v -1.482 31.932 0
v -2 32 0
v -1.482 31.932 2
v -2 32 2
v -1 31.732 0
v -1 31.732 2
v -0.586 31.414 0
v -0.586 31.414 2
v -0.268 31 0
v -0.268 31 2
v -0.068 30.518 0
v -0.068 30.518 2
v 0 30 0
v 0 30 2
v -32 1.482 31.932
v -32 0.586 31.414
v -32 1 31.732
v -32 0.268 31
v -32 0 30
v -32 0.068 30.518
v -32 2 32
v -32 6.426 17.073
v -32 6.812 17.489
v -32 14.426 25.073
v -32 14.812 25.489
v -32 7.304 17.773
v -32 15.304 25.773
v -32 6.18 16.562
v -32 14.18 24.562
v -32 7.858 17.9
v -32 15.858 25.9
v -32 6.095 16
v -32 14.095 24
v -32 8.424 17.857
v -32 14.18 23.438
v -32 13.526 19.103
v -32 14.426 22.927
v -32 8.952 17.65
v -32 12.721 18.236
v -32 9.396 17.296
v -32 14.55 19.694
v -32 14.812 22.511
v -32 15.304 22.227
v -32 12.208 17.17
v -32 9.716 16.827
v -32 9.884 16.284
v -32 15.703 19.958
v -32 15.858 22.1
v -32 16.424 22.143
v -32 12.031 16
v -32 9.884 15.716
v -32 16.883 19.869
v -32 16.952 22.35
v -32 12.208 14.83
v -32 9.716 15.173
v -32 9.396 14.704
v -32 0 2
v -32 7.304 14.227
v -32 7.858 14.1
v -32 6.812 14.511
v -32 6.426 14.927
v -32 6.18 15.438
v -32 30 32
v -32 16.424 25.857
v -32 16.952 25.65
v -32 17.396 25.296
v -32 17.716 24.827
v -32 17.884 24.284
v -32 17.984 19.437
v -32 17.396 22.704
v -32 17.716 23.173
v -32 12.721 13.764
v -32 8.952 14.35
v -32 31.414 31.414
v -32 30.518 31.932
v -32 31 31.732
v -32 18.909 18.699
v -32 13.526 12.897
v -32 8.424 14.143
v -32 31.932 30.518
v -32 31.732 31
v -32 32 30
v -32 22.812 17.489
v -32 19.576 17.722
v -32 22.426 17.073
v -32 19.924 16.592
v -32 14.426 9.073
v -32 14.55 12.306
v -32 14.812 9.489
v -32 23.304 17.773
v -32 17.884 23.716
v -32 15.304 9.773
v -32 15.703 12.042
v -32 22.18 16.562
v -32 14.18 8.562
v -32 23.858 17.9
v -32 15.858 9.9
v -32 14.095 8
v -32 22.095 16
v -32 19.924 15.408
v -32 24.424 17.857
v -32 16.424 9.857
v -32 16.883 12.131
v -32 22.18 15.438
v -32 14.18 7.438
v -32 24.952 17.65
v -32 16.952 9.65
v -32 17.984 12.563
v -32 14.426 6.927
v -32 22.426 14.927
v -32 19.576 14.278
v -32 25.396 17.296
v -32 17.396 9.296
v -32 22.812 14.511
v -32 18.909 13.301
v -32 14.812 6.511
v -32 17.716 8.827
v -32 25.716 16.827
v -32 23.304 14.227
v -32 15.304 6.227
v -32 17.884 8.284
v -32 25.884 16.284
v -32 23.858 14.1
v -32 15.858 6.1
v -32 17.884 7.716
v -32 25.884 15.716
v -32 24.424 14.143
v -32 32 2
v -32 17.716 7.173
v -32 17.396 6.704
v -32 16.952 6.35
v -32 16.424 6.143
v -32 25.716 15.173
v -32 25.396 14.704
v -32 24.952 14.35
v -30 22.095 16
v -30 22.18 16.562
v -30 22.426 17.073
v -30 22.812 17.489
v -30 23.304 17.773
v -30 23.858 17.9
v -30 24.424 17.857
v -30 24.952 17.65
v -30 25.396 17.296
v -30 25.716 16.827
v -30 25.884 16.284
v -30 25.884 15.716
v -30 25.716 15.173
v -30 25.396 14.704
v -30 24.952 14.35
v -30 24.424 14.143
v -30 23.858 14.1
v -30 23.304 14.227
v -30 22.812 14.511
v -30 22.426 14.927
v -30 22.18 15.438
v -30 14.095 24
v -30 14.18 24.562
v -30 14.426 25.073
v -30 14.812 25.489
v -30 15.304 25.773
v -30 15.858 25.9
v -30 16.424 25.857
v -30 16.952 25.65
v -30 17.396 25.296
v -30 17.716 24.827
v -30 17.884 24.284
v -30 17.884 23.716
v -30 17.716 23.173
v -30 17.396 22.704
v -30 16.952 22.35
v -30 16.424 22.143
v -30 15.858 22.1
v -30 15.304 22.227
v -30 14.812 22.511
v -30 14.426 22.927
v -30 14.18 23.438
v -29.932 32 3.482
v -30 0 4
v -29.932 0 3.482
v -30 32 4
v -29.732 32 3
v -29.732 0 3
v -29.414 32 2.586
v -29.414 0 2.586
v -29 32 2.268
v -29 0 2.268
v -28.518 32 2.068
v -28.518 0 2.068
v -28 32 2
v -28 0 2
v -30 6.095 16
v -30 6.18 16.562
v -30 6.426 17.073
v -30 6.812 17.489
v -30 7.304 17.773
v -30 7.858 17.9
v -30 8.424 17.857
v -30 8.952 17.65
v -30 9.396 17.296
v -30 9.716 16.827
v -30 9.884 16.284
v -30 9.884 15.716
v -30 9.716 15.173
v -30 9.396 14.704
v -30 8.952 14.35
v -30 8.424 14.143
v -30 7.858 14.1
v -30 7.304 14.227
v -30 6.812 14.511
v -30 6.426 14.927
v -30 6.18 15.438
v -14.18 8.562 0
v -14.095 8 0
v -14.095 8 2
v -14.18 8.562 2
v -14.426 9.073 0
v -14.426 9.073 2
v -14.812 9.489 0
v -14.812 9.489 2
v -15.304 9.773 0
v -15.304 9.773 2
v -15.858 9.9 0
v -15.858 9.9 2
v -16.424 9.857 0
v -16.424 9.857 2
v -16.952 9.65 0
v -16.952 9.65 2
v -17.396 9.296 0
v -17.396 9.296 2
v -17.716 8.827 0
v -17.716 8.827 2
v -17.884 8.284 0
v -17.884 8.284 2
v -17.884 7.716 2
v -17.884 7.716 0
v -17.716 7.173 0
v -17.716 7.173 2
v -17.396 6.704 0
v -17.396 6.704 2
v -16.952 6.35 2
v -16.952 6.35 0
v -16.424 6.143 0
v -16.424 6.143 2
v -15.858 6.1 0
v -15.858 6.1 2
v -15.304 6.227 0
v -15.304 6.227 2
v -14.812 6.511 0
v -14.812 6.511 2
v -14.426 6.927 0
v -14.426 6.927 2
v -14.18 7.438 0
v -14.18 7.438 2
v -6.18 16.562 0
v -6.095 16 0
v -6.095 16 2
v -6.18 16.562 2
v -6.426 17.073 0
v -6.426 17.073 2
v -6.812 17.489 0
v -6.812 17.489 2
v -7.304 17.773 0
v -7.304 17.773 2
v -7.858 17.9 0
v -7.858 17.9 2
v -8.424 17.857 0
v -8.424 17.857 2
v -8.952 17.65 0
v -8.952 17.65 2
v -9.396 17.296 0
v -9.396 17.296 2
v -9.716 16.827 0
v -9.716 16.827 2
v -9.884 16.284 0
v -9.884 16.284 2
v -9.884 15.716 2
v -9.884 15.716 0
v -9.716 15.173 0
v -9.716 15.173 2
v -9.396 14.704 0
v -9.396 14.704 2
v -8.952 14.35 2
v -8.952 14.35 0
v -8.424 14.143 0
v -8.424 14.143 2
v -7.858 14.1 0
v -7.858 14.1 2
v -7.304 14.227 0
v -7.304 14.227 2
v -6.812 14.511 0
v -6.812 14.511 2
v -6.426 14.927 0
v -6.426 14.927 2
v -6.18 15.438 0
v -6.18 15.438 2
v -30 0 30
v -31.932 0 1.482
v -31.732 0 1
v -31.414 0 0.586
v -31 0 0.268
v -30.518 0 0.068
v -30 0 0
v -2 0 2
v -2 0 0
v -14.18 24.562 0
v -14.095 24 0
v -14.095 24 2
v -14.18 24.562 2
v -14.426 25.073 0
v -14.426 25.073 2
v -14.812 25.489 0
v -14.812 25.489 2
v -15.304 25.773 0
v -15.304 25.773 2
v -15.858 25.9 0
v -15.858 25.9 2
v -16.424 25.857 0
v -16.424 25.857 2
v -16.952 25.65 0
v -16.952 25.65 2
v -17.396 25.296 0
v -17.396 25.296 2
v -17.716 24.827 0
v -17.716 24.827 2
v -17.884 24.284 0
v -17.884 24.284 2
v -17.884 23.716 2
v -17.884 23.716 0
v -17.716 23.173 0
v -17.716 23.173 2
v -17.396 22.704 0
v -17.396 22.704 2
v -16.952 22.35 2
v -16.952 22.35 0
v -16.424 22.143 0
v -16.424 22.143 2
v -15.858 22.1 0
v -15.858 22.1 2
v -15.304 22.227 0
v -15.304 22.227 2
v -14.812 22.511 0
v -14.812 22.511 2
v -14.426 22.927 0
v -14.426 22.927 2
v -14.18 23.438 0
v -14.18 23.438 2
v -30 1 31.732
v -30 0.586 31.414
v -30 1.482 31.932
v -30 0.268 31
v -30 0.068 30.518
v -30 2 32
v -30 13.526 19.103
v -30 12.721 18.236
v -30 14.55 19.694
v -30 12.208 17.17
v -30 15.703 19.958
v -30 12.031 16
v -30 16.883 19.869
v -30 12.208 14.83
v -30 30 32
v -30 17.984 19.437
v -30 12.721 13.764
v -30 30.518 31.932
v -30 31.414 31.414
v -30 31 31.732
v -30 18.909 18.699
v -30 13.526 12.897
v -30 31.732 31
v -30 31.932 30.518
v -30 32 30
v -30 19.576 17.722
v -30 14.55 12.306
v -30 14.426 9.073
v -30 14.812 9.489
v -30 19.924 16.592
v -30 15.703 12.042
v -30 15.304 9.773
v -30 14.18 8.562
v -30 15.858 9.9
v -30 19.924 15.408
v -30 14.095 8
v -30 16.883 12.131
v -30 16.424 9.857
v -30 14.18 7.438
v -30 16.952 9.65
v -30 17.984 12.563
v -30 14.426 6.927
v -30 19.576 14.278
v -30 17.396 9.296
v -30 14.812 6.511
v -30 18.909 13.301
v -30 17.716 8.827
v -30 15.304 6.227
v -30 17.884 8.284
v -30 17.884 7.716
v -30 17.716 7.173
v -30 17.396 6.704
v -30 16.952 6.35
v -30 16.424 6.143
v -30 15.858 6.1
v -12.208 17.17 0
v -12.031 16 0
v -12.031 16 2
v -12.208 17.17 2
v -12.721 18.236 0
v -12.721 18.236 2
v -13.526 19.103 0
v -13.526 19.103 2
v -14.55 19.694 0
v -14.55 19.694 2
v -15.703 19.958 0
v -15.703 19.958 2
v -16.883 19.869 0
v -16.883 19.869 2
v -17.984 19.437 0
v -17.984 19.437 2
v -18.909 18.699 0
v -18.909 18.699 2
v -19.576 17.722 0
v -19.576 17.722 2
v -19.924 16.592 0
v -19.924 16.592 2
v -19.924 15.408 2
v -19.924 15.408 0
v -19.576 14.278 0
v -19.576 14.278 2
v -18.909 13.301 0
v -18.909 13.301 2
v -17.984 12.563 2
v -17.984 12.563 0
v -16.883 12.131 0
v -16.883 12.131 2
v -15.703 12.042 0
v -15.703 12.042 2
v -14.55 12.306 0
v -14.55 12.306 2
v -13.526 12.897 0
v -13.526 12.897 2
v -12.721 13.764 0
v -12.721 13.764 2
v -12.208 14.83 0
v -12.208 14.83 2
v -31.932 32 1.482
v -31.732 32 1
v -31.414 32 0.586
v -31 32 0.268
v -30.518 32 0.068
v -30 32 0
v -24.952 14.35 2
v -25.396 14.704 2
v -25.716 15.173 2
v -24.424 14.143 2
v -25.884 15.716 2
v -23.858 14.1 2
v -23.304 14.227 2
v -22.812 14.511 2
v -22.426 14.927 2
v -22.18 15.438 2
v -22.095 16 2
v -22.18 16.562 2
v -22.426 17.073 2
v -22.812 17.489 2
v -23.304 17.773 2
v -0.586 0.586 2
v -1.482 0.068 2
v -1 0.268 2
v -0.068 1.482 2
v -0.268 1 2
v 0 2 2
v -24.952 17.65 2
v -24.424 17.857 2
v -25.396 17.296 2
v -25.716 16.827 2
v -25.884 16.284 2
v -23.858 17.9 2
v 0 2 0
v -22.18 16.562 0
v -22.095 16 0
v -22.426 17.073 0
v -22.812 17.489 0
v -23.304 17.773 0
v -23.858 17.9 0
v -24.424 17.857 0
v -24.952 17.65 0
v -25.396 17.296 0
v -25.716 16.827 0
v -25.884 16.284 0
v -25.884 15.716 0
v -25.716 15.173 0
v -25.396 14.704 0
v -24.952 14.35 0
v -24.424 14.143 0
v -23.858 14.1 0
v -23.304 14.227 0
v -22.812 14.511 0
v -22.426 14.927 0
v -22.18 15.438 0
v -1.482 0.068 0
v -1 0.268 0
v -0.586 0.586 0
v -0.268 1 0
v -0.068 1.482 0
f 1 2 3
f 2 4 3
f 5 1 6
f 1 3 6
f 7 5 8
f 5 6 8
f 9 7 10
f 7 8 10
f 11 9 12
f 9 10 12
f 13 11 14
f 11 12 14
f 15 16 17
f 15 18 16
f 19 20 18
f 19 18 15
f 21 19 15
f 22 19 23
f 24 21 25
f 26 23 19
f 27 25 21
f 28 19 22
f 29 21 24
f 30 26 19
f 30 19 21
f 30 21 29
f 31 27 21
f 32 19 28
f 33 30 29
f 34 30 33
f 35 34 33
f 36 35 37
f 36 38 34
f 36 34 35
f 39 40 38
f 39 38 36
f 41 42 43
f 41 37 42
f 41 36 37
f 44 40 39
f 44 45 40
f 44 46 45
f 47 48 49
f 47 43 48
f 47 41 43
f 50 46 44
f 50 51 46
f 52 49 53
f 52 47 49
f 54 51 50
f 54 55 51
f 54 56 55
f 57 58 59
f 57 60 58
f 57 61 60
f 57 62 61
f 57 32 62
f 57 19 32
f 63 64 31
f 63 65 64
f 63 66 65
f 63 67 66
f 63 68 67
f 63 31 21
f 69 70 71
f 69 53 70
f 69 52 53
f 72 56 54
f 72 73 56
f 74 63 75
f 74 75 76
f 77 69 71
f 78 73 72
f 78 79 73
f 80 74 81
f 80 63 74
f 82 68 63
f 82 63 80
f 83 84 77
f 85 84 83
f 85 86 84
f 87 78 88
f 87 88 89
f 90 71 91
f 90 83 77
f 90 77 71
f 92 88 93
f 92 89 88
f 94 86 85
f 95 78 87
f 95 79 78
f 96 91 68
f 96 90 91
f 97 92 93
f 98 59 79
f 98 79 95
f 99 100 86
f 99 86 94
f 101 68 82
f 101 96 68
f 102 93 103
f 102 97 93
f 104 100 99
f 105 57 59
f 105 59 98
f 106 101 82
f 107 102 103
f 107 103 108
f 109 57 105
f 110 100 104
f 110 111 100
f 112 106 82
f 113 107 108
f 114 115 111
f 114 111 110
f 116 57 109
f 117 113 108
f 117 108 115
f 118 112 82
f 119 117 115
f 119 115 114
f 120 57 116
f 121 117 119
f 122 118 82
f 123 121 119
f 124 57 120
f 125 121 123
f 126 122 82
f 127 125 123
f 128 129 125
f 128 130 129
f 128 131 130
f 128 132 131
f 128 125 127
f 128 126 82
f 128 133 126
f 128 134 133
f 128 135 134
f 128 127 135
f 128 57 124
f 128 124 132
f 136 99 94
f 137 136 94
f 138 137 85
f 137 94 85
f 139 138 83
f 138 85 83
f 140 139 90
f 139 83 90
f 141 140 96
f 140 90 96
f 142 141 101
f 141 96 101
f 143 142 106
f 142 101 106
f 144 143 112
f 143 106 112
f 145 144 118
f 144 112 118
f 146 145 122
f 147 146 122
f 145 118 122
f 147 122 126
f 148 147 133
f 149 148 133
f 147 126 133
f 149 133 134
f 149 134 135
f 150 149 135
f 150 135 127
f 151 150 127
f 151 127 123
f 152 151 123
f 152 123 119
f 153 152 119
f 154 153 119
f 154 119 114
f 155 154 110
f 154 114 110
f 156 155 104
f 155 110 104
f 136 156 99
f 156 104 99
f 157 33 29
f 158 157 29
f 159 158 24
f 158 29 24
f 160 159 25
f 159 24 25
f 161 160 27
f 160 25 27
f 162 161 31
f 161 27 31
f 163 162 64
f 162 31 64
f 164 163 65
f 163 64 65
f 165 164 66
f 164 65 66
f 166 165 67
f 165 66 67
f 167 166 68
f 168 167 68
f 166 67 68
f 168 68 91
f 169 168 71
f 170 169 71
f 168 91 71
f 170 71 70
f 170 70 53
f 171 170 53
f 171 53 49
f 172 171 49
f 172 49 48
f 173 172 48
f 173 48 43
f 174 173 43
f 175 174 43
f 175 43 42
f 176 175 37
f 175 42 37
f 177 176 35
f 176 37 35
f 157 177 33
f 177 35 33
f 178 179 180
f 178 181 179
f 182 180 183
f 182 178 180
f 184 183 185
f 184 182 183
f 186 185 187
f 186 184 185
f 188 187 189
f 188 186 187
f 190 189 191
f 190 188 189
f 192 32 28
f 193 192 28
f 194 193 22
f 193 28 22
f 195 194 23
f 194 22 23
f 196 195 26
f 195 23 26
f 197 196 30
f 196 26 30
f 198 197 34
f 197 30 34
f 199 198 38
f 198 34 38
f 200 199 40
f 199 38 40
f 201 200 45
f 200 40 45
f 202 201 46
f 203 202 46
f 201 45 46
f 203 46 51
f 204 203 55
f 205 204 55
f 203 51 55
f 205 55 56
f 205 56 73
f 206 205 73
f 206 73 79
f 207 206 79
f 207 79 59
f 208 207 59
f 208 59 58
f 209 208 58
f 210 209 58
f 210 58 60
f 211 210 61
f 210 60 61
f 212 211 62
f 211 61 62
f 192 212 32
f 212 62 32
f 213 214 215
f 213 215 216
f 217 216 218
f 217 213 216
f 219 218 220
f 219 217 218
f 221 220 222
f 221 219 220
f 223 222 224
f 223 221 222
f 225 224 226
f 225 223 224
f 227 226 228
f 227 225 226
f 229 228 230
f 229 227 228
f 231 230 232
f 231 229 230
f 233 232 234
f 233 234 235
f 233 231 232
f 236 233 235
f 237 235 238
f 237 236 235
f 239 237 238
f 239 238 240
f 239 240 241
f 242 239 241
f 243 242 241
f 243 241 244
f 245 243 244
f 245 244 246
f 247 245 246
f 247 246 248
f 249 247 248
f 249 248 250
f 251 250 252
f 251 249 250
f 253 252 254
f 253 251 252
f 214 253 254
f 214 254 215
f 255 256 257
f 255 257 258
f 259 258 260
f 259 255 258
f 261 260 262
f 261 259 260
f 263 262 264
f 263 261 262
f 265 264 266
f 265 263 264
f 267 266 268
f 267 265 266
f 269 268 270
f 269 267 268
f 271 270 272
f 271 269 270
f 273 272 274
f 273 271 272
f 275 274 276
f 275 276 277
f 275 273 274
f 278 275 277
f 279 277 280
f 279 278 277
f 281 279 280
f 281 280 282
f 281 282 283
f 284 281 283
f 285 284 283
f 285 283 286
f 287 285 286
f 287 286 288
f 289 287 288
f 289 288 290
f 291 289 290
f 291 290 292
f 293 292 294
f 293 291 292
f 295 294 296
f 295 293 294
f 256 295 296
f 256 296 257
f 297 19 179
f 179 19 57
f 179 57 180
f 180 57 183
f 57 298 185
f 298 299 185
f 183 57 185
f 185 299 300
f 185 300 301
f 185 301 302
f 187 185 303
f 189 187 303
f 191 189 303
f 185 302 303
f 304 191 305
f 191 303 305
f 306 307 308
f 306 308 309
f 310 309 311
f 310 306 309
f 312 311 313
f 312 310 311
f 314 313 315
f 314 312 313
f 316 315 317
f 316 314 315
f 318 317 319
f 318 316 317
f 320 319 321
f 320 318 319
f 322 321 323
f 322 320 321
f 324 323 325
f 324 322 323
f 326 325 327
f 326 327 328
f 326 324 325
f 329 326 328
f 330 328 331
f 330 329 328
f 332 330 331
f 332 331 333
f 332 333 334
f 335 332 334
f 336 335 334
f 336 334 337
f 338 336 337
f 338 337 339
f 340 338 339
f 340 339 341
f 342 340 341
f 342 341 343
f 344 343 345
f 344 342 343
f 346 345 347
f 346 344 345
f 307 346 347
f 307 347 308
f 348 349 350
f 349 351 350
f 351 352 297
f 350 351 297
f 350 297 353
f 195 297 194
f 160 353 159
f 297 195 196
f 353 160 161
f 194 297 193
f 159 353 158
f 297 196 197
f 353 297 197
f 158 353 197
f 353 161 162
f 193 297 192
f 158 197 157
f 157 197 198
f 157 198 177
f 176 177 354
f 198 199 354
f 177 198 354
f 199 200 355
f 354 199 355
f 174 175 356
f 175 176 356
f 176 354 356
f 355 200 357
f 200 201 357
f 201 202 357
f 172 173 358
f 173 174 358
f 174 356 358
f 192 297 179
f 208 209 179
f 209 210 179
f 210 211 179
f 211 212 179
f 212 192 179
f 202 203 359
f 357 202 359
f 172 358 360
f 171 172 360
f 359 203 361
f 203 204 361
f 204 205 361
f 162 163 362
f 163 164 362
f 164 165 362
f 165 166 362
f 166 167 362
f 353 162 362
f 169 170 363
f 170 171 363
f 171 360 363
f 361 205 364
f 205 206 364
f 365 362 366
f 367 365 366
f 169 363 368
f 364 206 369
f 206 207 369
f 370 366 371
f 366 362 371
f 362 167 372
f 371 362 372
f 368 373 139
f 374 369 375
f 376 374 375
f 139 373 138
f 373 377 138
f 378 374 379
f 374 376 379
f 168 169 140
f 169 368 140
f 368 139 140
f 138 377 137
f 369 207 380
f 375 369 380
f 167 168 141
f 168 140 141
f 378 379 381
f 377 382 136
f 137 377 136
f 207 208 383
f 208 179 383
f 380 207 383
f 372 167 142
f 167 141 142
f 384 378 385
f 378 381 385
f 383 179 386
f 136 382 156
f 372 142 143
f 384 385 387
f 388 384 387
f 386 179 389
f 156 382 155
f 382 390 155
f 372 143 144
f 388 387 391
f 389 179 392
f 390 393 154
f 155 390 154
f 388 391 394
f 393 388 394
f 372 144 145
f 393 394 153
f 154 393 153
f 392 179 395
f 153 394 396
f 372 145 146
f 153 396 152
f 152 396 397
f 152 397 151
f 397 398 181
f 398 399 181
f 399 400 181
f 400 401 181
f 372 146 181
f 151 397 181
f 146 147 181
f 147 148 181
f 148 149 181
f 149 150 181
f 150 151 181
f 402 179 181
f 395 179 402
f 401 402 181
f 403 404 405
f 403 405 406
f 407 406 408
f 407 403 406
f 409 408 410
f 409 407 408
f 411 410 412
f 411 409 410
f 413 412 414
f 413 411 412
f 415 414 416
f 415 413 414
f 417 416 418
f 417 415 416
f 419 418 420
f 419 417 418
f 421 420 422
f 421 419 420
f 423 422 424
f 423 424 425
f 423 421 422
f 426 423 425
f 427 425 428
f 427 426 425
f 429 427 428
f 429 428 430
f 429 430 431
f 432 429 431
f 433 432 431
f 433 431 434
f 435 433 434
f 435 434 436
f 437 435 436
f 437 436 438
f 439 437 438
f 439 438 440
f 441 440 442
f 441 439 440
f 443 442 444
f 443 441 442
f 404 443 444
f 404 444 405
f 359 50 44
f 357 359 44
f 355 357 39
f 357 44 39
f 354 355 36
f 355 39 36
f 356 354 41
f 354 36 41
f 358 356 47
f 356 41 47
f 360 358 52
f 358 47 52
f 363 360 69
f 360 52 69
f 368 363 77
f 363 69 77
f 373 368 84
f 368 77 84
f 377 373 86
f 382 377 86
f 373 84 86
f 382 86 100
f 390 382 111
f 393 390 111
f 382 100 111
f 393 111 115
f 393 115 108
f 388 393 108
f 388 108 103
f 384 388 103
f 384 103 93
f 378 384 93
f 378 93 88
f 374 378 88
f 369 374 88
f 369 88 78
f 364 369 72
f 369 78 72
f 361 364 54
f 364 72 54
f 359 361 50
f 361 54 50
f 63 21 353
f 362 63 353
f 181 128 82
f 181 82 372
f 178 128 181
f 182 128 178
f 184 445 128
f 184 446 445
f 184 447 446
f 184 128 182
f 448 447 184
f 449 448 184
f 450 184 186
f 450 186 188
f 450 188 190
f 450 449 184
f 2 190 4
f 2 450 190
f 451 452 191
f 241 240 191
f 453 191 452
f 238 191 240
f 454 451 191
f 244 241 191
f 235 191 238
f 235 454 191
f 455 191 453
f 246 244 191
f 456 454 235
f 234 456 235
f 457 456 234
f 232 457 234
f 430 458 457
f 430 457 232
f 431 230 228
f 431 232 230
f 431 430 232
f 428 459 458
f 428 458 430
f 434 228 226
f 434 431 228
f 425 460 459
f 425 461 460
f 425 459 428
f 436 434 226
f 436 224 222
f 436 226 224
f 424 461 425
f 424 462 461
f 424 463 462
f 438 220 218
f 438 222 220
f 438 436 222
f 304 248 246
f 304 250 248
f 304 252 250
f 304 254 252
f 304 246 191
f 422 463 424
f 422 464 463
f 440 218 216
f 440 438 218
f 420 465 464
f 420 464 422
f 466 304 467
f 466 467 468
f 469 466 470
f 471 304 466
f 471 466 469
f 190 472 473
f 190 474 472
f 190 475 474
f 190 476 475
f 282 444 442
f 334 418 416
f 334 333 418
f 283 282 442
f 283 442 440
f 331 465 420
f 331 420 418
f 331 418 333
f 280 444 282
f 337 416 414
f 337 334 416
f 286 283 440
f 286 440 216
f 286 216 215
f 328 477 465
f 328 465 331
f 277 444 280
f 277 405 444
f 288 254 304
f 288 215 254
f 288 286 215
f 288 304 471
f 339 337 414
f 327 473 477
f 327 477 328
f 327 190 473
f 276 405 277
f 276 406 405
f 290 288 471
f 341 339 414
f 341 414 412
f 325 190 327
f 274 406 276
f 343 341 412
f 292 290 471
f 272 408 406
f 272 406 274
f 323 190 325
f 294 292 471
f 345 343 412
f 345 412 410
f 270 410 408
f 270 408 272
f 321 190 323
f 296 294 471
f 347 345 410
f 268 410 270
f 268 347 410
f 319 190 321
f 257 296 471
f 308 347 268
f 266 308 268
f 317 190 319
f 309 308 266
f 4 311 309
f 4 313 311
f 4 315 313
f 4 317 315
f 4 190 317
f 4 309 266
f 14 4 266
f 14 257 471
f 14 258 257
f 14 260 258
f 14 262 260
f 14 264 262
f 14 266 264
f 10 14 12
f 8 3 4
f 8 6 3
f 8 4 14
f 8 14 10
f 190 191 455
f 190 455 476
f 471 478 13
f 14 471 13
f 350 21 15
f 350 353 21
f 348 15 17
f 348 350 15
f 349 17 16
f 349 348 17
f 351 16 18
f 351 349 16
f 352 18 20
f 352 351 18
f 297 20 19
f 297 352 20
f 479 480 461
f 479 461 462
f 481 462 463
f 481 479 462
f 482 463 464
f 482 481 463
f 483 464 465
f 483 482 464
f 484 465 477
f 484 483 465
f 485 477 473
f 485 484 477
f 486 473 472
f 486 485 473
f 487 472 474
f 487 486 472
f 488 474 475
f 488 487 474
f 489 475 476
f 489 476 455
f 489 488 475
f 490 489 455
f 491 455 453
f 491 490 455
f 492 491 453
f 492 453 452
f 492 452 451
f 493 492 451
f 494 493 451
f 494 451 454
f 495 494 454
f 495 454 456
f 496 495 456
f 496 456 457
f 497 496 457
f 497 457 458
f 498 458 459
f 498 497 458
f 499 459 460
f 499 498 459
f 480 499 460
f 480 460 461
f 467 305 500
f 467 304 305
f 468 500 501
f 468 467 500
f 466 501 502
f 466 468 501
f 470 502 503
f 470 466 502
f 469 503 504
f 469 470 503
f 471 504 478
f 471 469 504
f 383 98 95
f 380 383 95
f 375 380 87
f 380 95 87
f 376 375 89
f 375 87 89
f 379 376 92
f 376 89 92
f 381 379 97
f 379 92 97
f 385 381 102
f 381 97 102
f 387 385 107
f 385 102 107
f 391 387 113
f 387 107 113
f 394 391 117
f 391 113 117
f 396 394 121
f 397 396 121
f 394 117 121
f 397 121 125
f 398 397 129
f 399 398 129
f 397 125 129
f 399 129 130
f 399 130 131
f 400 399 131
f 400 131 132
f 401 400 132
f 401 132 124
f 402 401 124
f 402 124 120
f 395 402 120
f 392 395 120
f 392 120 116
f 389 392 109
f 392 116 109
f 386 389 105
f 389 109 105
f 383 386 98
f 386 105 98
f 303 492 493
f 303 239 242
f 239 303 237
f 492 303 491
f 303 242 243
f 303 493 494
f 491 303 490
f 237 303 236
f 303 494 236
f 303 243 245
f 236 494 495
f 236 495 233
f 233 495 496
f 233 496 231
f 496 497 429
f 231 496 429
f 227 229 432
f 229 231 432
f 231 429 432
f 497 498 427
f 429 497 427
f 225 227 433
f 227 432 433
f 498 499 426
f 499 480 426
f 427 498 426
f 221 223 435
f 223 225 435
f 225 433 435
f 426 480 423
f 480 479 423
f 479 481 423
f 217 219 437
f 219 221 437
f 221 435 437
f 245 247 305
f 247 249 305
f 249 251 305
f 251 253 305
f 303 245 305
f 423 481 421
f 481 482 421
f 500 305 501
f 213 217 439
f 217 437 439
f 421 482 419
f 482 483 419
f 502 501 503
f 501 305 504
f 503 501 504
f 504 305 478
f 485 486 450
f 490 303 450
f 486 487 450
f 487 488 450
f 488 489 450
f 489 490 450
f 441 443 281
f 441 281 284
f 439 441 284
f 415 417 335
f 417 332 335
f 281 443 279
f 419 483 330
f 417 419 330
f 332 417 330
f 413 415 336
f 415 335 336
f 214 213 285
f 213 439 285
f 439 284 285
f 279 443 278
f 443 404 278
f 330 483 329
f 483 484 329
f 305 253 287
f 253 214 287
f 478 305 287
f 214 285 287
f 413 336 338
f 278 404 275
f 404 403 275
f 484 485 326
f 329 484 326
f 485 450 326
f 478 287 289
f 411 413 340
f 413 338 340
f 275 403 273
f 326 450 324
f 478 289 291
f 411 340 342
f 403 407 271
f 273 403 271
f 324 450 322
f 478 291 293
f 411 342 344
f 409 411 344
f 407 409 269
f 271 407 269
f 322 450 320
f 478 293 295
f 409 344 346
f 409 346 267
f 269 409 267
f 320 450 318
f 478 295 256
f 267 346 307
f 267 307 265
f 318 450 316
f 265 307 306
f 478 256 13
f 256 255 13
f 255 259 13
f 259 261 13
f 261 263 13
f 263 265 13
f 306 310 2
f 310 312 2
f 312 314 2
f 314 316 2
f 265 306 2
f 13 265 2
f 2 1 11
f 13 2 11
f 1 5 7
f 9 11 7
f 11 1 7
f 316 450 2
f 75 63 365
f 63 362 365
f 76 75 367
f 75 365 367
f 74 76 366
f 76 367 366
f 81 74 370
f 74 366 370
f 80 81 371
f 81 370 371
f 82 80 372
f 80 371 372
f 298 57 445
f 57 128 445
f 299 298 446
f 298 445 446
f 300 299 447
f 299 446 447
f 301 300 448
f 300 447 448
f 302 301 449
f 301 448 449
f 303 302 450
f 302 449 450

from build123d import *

# Parameters (mm, degrees)
F0_W     = 32
F0_H     = 32
F0_R     = 1.905
F0_R_2   = 3.96875
F1_DEPTH = 2
F2_W     = 2
F2_H     = 32
F3_DEPTH = 30
F4_R     = 3.96875
F4_R_2   = 1.905
F5_DEPTH = 2
F6_R     = 2


# Not quite as in the source:
# - a feature names something its author has since deleted; it is built from what else it names


with BuildPart() as f1:
    # F0 (on Top) → F1 (new body)
    with BuildSketch(Plane.XY):
        with Locations((-16, 16)):
            Rectangle(F0_W, F0_H)
        with Locations((-16, 8)):
            Circle(F0_R, mode=Mode.SUBTRACT)
        with Locations((-24, 16)):
            Circle(F0_R, mode=Mode.SUBTRACT)
        with Locations((-16, 16)):
            Circle(F0_R_2, mode=Mode.SUBTRACT)
        with Locations((-8, 16)):
            Circle(F0_R, mode=Mode.SUBTRACT)
        with Locations((-16, 24)):
            Circle(F0_R, mode=Mode.SUBTRACT)
    extrude(amount=F1_DEPTH)

    # F2 (on face) → F3 (join)
    with BuildSketch(Plane.XY.offset(2)):
        with Locations((-31, 16)):
            Rectangle(F2_W, F2_H)
    extrude(amount=F3_DEPTH)

    # F4 (on face) → F5 (cut, through all)
    with BuildSketch(Plane(origin=(-32, 0, 0), x_dir=(0, -1, 0), z_dir=(-1, 0, 0))):
        with Locations((-16, 16)):
            Circle(F4_R)
        with Locations((-16, 24)):
            Circle(F4_R_2)
        with Locations((-24, 16)):
            Circle(F4_R_2)
        with Locations((-16, 8)):
            Circle(F4_R_2)
        with Locations((-8, 16)):
            Circle(F4_R_2)
    extrude(amount=-F5_DEPTH, mode=Mode.SUBTRACT)

    # F6
    f6_edges = [f1.edges().sort_by_distance(p)[0] for p in [
        (-31, 0, 32),
        (-31, 32, 32),
        (0, 0, 1),
        (0, 32, 1),
        (-30, 16, 2),
        (-32, 16, 0),
    ]]
    fillet(f6_edges, radius=F6_R)


solid = f1.part
